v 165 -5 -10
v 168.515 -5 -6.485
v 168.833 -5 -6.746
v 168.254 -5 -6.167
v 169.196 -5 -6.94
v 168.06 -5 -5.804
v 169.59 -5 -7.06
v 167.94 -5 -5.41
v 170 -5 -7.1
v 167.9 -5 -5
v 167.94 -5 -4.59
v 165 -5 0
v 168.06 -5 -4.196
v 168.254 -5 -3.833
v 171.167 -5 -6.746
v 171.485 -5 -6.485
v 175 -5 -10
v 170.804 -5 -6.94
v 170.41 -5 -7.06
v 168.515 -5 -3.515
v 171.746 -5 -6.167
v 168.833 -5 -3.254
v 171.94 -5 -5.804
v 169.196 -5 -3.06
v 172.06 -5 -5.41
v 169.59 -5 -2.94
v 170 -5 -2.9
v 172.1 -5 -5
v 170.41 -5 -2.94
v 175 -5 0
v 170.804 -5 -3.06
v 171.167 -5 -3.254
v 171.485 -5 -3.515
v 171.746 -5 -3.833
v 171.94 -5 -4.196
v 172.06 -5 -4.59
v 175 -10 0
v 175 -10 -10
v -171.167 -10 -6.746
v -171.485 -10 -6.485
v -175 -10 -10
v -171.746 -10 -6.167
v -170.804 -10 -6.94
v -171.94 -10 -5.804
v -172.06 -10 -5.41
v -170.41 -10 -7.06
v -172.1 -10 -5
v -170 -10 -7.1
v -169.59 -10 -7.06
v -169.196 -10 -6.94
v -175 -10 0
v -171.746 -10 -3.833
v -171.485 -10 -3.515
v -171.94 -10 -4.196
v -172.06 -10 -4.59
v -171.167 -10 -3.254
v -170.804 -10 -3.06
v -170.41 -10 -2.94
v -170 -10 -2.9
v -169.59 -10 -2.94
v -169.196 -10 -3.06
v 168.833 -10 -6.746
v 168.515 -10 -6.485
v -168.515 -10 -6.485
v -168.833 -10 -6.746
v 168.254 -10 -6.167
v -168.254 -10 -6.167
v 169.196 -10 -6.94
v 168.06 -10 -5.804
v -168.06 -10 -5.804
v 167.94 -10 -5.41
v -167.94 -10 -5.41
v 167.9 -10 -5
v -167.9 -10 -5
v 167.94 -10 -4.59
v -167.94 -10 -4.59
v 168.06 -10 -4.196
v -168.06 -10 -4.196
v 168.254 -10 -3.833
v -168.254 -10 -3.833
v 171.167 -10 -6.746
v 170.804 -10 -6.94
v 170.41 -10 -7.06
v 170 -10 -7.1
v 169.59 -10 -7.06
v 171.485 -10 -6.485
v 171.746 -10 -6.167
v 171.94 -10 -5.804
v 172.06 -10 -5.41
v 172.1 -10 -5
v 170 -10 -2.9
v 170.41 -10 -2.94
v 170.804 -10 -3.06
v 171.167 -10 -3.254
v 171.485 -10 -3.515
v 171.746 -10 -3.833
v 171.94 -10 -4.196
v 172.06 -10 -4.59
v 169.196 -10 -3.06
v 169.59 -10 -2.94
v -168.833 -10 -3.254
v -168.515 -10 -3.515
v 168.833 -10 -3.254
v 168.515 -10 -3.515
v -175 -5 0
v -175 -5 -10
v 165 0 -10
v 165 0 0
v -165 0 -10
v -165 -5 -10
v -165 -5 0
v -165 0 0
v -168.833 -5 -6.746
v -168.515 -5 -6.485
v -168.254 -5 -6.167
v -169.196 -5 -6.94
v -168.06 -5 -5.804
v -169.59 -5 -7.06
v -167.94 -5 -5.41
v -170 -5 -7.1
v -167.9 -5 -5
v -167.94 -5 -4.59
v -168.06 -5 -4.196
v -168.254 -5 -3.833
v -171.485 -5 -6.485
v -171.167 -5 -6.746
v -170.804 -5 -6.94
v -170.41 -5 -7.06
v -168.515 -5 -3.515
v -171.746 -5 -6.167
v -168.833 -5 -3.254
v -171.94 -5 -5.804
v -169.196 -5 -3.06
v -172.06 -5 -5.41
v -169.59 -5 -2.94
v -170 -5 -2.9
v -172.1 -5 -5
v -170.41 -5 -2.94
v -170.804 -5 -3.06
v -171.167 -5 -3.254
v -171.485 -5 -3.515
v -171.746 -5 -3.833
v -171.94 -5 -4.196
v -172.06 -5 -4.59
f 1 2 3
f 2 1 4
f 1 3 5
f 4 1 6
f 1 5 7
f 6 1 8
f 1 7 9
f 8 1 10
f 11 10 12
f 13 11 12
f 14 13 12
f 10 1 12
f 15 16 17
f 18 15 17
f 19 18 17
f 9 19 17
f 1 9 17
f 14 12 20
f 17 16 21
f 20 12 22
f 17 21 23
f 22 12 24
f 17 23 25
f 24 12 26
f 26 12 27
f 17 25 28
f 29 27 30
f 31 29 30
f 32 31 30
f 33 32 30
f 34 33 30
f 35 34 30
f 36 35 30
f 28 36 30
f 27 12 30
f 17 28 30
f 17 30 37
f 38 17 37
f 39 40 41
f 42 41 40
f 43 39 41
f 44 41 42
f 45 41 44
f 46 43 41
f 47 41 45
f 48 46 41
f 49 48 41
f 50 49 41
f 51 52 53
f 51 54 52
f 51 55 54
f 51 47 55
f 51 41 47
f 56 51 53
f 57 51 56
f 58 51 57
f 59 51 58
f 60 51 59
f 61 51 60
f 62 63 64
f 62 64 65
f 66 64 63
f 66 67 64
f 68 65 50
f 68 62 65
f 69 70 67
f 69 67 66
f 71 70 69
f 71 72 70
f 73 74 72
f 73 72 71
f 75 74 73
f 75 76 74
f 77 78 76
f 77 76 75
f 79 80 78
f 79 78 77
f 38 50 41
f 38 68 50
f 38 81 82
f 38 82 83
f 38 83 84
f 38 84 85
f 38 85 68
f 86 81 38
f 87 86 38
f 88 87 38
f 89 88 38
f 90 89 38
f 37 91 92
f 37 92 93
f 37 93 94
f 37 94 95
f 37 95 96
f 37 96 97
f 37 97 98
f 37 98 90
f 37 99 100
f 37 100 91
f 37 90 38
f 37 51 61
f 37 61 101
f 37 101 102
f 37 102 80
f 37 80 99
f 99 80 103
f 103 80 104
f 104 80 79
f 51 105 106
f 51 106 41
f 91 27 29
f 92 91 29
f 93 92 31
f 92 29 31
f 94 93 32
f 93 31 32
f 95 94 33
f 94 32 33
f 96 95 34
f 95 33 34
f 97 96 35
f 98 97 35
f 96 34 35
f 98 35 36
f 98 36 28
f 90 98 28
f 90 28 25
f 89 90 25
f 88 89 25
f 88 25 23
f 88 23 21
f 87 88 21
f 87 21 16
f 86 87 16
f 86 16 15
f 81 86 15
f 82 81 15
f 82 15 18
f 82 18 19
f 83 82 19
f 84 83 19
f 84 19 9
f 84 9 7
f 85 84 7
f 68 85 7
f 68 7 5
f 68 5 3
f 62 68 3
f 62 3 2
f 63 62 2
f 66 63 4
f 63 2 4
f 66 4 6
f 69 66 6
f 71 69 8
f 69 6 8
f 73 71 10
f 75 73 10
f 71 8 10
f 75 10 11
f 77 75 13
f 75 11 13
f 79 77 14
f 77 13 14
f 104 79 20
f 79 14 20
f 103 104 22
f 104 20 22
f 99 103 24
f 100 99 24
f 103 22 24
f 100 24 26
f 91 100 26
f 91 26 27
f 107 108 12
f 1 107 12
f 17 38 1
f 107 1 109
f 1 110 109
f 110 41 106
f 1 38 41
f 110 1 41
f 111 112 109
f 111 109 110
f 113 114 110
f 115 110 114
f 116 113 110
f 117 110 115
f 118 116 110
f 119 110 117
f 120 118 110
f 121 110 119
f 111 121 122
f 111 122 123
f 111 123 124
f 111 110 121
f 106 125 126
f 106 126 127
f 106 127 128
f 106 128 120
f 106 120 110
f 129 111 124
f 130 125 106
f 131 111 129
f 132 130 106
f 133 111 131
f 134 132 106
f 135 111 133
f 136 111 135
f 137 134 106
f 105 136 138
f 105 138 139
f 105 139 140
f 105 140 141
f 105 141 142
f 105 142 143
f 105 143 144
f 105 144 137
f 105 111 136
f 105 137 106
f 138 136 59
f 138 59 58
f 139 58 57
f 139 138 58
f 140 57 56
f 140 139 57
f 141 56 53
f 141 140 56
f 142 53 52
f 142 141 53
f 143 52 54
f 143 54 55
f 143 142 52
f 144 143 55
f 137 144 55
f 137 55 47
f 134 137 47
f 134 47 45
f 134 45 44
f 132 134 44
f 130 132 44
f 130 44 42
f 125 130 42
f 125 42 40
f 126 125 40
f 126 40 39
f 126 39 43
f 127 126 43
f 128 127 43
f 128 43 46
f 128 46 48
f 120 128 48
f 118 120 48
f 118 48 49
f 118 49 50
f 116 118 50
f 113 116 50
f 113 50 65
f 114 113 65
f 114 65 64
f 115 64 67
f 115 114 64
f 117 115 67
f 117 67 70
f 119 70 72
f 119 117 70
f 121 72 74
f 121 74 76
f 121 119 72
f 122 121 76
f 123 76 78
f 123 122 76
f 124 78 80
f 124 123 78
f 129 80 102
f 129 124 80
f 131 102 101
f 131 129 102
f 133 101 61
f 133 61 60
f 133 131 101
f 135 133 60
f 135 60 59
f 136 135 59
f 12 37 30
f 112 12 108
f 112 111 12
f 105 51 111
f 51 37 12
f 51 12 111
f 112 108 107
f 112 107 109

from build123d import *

# Parameters (mm, degrees)
F1_DEPTH = 10
F2_R     = 2.1
F3_DEPTH = 5.001
F5_ANGLE = 90


with BuildPart() as f1:
    # F0 (on Right) → F1 (new body)
    with BuildSketch(Plane.YZ):
        Polygon((-10, 0), (0, 0), (0, 165), (-5, 165), (-5, 175), (-10, 175), align=None)
    extrude(amount=F1_DEPTH)

    # F2 (on face) → F3 (cut, through all)
    with BuildSketch(Plane(origin=(0, -5, 0), x_dir=(-1, 0, 0), z_dir=(0, 1, 0))):
        with Locations((-5, 170)):
            Circle(F2_R)
    extrude(amount=-F3_DEPTH, mode=Mode.SUBTRACT)

    # F4: F1 across plane


with BuildPart() as f1_1:
    add(f1.part)
    add(f1.part.mirror(Plane.XY))


with BuildPart() as f1_2:
    # F5: moved
    add(f1_1.part.rotate(Axis((0, -5, 0), (0, 1, 0)), F5_ANGLE))


solid = f1_2.part
